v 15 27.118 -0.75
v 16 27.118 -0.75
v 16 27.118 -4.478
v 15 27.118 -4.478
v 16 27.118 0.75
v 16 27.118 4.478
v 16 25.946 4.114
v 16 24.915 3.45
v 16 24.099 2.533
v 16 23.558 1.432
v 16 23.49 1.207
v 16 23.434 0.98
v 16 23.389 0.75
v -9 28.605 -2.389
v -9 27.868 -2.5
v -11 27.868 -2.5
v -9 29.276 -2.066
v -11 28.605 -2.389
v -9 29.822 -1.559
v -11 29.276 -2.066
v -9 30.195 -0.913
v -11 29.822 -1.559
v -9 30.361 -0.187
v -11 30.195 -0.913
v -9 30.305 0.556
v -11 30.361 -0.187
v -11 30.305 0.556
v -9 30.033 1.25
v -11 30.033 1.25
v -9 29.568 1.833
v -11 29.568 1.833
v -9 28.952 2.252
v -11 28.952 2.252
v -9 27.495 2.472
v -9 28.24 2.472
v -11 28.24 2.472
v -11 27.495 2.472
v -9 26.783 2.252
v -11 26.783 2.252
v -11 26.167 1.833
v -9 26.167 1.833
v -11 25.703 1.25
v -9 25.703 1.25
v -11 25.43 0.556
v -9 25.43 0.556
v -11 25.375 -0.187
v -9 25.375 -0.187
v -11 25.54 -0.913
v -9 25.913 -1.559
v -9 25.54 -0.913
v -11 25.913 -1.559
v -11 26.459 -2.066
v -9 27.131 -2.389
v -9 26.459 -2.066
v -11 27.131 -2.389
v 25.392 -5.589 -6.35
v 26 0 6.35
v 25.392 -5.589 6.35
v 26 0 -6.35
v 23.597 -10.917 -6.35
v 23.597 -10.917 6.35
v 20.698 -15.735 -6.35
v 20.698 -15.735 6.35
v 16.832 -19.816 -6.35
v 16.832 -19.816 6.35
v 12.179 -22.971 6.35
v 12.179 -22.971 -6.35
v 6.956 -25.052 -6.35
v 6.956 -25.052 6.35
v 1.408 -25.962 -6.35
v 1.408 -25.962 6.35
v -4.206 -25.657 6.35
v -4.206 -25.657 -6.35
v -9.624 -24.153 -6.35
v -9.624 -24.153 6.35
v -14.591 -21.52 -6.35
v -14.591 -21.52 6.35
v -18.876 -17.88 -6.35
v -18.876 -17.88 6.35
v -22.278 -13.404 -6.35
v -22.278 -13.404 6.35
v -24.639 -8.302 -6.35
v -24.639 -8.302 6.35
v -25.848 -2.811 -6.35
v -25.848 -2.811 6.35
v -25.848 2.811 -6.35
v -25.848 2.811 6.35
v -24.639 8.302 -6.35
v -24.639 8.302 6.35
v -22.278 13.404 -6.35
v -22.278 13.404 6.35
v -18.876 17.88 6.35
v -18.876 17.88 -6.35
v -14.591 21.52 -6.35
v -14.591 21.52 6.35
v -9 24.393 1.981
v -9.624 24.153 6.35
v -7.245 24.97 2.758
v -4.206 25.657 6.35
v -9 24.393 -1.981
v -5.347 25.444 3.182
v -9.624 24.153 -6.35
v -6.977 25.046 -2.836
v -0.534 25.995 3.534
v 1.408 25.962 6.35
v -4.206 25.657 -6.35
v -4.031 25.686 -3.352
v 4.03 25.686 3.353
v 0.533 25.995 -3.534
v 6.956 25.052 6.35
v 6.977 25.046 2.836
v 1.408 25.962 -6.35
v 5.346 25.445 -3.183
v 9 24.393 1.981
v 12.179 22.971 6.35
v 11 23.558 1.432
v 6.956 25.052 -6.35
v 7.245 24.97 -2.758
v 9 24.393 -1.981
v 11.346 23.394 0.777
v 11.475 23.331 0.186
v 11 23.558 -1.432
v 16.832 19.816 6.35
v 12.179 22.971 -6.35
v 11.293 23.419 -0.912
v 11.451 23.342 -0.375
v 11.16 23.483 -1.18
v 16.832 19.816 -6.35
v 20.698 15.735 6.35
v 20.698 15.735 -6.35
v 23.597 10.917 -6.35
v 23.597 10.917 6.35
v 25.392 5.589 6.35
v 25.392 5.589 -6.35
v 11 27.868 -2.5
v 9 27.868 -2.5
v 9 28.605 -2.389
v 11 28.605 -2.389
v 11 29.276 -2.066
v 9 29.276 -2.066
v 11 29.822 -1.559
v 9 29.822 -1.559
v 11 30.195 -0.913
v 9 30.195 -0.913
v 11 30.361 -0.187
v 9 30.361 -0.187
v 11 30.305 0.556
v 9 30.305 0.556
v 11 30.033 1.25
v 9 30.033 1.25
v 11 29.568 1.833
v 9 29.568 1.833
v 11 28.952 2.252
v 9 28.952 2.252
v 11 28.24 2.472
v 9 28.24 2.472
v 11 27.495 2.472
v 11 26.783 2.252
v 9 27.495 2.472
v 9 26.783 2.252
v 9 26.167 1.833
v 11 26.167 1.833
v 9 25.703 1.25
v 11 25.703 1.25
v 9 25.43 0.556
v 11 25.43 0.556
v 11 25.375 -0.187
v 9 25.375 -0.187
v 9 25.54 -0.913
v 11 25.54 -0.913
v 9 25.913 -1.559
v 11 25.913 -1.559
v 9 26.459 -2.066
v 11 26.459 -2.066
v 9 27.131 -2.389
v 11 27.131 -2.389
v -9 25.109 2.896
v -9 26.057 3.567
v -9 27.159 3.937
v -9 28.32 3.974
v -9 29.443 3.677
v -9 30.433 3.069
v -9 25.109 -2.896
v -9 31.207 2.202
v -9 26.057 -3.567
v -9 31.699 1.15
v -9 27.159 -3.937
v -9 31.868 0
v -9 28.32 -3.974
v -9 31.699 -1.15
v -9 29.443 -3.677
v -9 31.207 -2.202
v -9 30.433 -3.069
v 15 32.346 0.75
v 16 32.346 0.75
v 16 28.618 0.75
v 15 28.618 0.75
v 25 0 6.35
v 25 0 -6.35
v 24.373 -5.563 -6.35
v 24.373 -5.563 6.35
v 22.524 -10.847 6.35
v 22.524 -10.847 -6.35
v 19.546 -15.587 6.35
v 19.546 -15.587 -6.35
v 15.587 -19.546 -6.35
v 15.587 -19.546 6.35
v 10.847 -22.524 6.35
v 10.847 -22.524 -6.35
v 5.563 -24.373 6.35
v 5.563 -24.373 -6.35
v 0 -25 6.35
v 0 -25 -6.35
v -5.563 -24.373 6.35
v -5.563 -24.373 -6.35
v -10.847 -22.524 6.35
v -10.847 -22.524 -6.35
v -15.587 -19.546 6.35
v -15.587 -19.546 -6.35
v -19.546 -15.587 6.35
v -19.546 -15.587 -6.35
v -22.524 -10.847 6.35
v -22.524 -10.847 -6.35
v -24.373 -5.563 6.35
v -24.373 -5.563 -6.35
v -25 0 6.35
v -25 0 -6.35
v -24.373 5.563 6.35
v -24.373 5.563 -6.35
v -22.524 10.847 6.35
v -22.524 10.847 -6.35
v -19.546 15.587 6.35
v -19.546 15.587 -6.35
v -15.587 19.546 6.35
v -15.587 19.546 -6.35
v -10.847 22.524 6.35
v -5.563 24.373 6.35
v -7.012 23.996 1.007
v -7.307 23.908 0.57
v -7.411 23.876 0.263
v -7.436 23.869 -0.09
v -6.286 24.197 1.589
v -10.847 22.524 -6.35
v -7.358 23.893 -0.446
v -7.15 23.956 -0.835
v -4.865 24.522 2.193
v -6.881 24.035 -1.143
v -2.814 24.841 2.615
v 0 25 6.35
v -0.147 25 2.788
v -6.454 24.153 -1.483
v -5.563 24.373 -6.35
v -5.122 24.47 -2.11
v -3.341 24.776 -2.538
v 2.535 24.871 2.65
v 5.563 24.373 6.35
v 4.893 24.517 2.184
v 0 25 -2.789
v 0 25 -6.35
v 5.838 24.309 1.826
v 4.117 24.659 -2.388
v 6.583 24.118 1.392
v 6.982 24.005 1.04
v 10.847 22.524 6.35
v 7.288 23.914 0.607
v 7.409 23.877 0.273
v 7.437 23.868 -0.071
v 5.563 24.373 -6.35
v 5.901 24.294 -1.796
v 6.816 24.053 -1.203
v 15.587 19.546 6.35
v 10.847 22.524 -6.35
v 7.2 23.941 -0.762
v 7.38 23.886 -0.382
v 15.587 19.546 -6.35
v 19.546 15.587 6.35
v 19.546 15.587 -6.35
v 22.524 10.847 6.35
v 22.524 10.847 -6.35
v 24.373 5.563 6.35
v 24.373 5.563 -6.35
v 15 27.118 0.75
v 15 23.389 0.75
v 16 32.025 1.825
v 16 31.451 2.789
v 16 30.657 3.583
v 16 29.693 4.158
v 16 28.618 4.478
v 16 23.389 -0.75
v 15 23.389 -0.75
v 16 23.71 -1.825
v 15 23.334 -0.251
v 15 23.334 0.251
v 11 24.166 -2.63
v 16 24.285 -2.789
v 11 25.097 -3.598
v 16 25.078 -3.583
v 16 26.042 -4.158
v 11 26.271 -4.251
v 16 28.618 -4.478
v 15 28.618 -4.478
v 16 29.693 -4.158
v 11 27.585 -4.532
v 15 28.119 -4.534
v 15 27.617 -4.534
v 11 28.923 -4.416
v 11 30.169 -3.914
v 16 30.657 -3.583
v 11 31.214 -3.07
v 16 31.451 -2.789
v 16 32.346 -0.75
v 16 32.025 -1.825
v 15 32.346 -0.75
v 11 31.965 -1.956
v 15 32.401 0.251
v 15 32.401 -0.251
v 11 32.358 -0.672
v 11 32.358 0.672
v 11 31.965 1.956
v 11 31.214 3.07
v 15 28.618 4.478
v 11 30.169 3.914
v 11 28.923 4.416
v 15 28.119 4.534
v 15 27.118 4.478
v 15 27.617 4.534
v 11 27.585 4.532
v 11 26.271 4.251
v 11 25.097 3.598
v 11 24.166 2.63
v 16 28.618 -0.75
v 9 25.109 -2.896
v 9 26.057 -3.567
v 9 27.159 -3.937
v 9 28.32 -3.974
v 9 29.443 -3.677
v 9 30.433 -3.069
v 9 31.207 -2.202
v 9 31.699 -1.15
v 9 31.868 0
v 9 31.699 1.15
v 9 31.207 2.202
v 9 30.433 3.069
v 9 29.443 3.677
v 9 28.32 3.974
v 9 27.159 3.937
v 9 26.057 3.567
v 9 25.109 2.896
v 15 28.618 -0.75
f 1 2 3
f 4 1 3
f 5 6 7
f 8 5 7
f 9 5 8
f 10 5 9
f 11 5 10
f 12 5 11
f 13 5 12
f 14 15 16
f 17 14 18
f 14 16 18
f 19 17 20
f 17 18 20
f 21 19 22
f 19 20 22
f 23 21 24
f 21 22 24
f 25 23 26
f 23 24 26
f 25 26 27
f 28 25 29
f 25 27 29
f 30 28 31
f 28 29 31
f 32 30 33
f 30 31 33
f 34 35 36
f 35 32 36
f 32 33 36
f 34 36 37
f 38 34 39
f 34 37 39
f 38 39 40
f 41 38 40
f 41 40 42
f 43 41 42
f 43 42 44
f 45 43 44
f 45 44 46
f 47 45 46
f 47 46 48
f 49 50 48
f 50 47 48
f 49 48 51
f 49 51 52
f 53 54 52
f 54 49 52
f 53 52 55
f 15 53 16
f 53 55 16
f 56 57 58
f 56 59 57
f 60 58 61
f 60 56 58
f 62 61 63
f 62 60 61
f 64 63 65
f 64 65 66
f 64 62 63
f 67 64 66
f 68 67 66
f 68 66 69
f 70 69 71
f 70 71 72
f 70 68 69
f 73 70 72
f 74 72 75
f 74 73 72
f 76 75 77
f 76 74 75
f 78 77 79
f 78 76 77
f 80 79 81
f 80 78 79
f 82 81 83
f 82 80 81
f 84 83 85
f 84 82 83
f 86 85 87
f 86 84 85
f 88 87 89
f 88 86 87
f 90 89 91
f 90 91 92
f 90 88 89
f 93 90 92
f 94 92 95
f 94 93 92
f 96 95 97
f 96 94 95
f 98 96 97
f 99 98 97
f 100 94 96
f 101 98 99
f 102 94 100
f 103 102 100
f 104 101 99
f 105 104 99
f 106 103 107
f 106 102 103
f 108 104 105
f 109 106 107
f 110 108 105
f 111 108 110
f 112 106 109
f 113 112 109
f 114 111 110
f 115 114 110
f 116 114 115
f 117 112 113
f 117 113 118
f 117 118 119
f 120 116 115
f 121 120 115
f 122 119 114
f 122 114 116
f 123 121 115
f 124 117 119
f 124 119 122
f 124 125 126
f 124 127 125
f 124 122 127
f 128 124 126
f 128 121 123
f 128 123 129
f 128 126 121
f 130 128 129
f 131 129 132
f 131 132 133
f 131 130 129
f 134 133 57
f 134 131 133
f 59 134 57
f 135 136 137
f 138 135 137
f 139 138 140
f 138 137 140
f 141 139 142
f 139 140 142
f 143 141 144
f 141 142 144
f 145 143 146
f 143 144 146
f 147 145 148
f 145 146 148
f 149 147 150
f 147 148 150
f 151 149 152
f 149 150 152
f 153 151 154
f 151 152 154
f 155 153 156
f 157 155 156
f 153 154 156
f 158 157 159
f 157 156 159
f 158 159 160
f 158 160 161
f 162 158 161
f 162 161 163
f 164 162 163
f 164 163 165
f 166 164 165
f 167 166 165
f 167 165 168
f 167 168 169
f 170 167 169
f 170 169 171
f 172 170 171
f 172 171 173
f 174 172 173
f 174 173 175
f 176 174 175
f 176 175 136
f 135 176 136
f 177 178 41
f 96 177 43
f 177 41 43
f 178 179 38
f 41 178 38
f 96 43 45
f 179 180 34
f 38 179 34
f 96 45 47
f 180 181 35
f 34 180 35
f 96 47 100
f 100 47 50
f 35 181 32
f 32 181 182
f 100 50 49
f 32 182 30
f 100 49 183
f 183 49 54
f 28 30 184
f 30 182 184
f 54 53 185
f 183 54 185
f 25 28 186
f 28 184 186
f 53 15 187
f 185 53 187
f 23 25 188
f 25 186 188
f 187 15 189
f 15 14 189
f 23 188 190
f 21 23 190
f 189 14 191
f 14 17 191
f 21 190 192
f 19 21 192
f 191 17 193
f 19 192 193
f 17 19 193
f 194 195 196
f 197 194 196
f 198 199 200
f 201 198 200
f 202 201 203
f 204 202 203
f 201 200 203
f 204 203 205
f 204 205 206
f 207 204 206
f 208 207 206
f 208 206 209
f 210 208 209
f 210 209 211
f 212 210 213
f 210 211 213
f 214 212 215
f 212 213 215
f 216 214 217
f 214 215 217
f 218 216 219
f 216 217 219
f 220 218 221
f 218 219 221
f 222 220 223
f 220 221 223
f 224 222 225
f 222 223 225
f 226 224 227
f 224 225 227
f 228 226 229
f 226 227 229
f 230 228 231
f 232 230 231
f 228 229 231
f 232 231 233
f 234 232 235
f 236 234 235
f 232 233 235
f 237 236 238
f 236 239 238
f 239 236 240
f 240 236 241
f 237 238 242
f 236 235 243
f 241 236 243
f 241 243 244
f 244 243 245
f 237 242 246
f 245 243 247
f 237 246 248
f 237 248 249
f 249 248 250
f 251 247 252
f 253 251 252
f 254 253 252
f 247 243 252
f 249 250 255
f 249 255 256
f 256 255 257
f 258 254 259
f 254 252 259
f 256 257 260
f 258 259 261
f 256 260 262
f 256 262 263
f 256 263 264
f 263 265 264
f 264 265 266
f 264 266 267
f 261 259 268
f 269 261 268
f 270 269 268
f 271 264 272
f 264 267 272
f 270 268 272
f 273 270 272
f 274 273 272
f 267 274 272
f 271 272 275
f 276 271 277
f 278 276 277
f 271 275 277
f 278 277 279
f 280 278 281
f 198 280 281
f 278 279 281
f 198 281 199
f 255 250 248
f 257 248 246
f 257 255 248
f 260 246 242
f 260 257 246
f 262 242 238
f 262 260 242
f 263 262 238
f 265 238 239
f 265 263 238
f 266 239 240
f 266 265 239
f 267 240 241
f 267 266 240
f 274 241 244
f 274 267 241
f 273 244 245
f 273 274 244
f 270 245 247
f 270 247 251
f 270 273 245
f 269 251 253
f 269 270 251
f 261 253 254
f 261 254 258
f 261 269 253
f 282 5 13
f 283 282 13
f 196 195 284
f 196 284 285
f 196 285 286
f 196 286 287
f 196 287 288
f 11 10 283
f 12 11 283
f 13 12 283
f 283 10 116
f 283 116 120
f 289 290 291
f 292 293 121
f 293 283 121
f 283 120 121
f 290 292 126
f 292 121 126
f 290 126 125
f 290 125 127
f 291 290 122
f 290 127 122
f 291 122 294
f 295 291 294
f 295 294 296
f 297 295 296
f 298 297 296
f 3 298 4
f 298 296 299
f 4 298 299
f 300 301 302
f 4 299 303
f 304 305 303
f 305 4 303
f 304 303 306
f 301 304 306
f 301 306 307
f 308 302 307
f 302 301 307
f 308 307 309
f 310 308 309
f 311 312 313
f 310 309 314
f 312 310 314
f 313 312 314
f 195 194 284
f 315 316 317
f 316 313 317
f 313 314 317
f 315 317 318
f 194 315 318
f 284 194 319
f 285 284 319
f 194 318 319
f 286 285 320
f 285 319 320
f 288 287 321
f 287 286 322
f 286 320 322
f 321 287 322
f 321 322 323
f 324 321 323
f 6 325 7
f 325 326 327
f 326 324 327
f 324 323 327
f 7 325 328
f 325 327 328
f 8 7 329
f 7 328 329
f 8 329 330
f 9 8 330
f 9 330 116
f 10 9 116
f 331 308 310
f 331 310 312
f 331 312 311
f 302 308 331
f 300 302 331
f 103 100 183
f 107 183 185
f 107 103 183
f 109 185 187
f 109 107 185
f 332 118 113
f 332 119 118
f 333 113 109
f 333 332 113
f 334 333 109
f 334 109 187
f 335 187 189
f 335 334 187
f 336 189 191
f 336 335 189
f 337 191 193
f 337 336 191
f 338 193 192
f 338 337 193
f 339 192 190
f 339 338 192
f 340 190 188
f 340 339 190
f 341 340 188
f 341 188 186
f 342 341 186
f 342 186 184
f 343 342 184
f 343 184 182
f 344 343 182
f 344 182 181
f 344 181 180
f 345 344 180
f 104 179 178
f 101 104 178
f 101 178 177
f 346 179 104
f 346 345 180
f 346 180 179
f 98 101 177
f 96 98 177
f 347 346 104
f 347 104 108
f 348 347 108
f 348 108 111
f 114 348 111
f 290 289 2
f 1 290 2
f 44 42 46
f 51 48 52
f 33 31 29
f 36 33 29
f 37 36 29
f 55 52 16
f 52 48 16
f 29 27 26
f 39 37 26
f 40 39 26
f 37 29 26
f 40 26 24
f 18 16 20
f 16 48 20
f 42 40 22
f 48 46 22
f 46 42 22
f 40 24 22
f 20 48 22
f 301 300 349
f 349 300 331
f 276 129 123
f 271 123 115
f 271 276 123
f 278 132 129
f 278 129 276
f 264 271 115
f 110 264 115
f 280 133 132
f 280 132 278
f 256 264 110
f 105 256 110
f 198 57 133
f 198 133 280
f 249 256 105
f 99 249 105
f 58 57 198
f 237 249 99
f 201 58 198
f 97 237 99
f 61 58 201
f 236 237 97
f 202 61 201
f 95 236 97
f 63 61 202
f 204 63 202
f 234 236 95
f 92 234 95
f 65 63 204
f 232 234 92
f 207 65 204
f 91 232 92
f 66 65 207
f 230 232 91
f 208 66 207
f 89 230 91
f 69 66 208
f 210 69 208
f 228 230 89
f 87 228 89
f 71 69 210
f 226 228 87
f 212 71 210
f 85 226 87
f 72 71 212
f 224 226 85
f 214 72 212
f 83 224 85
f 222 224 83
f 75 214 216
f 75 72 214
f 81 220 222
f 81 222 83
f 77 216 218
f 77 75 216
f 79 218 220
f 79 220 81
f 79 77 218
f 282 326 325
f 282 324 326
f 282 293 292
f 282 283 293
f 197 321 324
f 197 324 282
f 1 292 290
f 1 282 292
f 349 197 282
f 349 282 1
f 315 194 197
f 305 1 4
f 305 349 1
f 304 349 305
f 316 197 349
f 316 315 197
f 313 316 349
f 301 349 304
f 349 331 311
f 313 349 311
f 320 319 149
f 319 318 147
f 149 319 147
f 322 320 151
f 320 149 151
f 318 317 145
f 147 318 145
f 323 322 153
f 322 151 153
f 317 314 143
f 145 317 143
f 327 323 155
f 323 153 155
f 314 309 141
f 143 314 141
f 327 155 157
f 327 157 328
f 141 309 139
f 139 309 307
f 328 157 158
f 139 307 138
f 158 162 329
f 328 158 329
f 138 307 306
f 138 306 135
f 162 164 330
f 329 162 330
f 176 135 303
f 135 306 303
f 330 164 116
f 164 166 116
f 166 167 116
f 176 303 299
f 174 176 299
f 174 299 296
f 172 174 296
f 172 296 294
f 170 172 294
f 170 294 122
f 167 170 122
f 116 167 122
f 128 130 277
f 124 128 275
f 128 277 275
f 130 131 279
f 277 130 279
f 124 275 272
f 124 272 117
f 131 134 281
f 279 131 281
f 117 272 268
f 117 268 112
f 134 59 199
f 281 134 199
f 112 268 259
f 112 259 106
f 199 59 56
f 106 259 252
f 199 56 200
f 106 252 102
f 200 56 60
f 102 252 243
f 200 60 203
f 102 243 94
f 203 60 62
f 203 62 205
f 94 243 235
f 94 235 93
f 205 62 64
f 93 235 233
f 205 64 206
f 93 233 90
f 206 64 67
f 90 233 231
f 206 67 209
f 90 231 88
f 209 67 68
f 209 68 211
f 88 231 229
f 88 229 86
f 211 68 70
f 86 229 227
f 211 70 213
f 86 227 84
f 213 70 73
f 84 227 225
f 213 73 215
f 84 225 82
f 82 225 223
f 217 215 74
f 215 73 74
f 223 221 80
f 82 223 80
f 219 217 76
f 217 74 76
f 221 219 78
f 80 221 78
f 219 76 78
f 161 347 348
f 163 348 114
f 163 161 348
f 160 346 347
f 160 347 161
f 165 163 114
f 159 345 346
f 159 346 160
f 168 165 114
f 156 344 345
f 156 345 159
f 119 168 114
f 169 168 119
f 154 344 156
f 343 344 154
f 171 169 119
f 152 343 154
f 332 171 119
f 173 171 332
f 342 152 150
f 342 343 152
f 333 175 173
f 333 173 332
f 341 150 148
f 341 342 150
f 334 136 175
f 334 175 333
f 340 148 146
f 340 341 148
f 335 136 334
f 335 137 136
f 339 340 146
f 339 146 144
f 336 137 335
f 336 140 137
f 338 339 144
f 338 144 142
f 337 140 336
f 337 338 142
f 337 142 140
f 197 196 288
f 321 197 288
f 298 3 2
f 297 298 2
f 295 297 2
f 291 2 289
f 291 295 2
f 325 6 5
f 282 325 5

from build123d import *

# Parameters (mm, degrees)
SKETCH1_W                = 12.7
SKETCH1_H                = 1
SKETCH2_R                = 4
BOSS_EXTRUDE1_DEPTH      = 9
BOSS_EXTRUDE2_DEPTH      = 2
BOSS_EXTRUDE2_DEPTH_BACK = 20
SKETCH3_R                = 2.5
SKETCH4_R                = 4.540800692
BOSS_EXTRUDE3_DEPTH      = 5
CUT_EXTRUDE1_DEPTH       = 1


with BuildPart() as part:
    # Sketch1 → Revolve1 (revolve)
    with BuildSketch(Plane(origin=(0, 0, 0), x_dir=(0, 0, -1), z_dir=(1, 0, 0)), mode=Mode.PRIVATE) as revolve1_sk:
        with Locations((0, 25.5)):
            Rectangle(SKETCH1_W, SKETCH1_H)
    revolve(revolve1_sk.sketch.rotate(Axis((0, 0, 0), (0, 0, -1)), 90), axis=Axis((0, 0, 0), (0, 0, -1)))

    # Sketch2 → Boss-Extrude1 (add, symmetric)
    with BuildSketch(Plane(origin=(0, 0, 0), x_dir=(0, 0, -1), z_dir=(1, 0, 0))):
        with Locations((0, 27.867620805)):
            Circle(SKETCH2_R)
    extrude(amount=BOSS_EXTRUDE1_DEPTH, both=True)

    # Sketch3 → Boss-Extrude2 (add, two sides: drawn at the far end of the back side and taken through both)
    with BuildSketch(Plane(origin=(9, 0, 0), x_dir=(0, 0, -1), z_dir=(1, 0, 0)).offset(-BOSS_EXTRUDE2_DEPTH_BACK)):
        with Locations((0, 27.867620805)):
            Circle(SKETCH3_R)
    extrude(amount=BOSS_EXTRUDE2_DEPTH + BOSS_EXTRUDE2_DEPTH_BACK)

    # Sketch4 → Boss-Extrude3 (add)
    with BuildSketch(Plane(origin=(11, 0, 0), x_dir=(0, 0, -1), z_dir=(1, 0, 0))):
        with Locations(Location((0, 27.867620805, 0), (0, 0, 251.621037372))):
            Circle(SKETCH4_R)
    extrude(amount=BOSS_EXTRUDE3_DEPTH)

    # Sketch5 → Cut-Extrude1 (cut)
    with BuildSketch(Plane(origin=(16, 0, 0), x_dir=(0, 0, -1), z_dir=(1, 0, 0))):
        Polygon((0.75, 27.117620805), (5.588794468, 27.117620805), (5.588794468, 28.617620805), (0.75, 28.617620805), (0.75, 32.881878849), (-0.75, 32.881878849), (-0.75, 28.617620805), (-5.588794468, 28.617620805), (-5.588794468, 27.117620805), (-0.75, 27.117620805), (-0.75, 22.853362761), (0.75, 22.853362761), align=None)
    extrude(amount=-CUT_EXTRUDE1_DEPTH, mode=Mode.SUBTRACT)


solid = part.part
